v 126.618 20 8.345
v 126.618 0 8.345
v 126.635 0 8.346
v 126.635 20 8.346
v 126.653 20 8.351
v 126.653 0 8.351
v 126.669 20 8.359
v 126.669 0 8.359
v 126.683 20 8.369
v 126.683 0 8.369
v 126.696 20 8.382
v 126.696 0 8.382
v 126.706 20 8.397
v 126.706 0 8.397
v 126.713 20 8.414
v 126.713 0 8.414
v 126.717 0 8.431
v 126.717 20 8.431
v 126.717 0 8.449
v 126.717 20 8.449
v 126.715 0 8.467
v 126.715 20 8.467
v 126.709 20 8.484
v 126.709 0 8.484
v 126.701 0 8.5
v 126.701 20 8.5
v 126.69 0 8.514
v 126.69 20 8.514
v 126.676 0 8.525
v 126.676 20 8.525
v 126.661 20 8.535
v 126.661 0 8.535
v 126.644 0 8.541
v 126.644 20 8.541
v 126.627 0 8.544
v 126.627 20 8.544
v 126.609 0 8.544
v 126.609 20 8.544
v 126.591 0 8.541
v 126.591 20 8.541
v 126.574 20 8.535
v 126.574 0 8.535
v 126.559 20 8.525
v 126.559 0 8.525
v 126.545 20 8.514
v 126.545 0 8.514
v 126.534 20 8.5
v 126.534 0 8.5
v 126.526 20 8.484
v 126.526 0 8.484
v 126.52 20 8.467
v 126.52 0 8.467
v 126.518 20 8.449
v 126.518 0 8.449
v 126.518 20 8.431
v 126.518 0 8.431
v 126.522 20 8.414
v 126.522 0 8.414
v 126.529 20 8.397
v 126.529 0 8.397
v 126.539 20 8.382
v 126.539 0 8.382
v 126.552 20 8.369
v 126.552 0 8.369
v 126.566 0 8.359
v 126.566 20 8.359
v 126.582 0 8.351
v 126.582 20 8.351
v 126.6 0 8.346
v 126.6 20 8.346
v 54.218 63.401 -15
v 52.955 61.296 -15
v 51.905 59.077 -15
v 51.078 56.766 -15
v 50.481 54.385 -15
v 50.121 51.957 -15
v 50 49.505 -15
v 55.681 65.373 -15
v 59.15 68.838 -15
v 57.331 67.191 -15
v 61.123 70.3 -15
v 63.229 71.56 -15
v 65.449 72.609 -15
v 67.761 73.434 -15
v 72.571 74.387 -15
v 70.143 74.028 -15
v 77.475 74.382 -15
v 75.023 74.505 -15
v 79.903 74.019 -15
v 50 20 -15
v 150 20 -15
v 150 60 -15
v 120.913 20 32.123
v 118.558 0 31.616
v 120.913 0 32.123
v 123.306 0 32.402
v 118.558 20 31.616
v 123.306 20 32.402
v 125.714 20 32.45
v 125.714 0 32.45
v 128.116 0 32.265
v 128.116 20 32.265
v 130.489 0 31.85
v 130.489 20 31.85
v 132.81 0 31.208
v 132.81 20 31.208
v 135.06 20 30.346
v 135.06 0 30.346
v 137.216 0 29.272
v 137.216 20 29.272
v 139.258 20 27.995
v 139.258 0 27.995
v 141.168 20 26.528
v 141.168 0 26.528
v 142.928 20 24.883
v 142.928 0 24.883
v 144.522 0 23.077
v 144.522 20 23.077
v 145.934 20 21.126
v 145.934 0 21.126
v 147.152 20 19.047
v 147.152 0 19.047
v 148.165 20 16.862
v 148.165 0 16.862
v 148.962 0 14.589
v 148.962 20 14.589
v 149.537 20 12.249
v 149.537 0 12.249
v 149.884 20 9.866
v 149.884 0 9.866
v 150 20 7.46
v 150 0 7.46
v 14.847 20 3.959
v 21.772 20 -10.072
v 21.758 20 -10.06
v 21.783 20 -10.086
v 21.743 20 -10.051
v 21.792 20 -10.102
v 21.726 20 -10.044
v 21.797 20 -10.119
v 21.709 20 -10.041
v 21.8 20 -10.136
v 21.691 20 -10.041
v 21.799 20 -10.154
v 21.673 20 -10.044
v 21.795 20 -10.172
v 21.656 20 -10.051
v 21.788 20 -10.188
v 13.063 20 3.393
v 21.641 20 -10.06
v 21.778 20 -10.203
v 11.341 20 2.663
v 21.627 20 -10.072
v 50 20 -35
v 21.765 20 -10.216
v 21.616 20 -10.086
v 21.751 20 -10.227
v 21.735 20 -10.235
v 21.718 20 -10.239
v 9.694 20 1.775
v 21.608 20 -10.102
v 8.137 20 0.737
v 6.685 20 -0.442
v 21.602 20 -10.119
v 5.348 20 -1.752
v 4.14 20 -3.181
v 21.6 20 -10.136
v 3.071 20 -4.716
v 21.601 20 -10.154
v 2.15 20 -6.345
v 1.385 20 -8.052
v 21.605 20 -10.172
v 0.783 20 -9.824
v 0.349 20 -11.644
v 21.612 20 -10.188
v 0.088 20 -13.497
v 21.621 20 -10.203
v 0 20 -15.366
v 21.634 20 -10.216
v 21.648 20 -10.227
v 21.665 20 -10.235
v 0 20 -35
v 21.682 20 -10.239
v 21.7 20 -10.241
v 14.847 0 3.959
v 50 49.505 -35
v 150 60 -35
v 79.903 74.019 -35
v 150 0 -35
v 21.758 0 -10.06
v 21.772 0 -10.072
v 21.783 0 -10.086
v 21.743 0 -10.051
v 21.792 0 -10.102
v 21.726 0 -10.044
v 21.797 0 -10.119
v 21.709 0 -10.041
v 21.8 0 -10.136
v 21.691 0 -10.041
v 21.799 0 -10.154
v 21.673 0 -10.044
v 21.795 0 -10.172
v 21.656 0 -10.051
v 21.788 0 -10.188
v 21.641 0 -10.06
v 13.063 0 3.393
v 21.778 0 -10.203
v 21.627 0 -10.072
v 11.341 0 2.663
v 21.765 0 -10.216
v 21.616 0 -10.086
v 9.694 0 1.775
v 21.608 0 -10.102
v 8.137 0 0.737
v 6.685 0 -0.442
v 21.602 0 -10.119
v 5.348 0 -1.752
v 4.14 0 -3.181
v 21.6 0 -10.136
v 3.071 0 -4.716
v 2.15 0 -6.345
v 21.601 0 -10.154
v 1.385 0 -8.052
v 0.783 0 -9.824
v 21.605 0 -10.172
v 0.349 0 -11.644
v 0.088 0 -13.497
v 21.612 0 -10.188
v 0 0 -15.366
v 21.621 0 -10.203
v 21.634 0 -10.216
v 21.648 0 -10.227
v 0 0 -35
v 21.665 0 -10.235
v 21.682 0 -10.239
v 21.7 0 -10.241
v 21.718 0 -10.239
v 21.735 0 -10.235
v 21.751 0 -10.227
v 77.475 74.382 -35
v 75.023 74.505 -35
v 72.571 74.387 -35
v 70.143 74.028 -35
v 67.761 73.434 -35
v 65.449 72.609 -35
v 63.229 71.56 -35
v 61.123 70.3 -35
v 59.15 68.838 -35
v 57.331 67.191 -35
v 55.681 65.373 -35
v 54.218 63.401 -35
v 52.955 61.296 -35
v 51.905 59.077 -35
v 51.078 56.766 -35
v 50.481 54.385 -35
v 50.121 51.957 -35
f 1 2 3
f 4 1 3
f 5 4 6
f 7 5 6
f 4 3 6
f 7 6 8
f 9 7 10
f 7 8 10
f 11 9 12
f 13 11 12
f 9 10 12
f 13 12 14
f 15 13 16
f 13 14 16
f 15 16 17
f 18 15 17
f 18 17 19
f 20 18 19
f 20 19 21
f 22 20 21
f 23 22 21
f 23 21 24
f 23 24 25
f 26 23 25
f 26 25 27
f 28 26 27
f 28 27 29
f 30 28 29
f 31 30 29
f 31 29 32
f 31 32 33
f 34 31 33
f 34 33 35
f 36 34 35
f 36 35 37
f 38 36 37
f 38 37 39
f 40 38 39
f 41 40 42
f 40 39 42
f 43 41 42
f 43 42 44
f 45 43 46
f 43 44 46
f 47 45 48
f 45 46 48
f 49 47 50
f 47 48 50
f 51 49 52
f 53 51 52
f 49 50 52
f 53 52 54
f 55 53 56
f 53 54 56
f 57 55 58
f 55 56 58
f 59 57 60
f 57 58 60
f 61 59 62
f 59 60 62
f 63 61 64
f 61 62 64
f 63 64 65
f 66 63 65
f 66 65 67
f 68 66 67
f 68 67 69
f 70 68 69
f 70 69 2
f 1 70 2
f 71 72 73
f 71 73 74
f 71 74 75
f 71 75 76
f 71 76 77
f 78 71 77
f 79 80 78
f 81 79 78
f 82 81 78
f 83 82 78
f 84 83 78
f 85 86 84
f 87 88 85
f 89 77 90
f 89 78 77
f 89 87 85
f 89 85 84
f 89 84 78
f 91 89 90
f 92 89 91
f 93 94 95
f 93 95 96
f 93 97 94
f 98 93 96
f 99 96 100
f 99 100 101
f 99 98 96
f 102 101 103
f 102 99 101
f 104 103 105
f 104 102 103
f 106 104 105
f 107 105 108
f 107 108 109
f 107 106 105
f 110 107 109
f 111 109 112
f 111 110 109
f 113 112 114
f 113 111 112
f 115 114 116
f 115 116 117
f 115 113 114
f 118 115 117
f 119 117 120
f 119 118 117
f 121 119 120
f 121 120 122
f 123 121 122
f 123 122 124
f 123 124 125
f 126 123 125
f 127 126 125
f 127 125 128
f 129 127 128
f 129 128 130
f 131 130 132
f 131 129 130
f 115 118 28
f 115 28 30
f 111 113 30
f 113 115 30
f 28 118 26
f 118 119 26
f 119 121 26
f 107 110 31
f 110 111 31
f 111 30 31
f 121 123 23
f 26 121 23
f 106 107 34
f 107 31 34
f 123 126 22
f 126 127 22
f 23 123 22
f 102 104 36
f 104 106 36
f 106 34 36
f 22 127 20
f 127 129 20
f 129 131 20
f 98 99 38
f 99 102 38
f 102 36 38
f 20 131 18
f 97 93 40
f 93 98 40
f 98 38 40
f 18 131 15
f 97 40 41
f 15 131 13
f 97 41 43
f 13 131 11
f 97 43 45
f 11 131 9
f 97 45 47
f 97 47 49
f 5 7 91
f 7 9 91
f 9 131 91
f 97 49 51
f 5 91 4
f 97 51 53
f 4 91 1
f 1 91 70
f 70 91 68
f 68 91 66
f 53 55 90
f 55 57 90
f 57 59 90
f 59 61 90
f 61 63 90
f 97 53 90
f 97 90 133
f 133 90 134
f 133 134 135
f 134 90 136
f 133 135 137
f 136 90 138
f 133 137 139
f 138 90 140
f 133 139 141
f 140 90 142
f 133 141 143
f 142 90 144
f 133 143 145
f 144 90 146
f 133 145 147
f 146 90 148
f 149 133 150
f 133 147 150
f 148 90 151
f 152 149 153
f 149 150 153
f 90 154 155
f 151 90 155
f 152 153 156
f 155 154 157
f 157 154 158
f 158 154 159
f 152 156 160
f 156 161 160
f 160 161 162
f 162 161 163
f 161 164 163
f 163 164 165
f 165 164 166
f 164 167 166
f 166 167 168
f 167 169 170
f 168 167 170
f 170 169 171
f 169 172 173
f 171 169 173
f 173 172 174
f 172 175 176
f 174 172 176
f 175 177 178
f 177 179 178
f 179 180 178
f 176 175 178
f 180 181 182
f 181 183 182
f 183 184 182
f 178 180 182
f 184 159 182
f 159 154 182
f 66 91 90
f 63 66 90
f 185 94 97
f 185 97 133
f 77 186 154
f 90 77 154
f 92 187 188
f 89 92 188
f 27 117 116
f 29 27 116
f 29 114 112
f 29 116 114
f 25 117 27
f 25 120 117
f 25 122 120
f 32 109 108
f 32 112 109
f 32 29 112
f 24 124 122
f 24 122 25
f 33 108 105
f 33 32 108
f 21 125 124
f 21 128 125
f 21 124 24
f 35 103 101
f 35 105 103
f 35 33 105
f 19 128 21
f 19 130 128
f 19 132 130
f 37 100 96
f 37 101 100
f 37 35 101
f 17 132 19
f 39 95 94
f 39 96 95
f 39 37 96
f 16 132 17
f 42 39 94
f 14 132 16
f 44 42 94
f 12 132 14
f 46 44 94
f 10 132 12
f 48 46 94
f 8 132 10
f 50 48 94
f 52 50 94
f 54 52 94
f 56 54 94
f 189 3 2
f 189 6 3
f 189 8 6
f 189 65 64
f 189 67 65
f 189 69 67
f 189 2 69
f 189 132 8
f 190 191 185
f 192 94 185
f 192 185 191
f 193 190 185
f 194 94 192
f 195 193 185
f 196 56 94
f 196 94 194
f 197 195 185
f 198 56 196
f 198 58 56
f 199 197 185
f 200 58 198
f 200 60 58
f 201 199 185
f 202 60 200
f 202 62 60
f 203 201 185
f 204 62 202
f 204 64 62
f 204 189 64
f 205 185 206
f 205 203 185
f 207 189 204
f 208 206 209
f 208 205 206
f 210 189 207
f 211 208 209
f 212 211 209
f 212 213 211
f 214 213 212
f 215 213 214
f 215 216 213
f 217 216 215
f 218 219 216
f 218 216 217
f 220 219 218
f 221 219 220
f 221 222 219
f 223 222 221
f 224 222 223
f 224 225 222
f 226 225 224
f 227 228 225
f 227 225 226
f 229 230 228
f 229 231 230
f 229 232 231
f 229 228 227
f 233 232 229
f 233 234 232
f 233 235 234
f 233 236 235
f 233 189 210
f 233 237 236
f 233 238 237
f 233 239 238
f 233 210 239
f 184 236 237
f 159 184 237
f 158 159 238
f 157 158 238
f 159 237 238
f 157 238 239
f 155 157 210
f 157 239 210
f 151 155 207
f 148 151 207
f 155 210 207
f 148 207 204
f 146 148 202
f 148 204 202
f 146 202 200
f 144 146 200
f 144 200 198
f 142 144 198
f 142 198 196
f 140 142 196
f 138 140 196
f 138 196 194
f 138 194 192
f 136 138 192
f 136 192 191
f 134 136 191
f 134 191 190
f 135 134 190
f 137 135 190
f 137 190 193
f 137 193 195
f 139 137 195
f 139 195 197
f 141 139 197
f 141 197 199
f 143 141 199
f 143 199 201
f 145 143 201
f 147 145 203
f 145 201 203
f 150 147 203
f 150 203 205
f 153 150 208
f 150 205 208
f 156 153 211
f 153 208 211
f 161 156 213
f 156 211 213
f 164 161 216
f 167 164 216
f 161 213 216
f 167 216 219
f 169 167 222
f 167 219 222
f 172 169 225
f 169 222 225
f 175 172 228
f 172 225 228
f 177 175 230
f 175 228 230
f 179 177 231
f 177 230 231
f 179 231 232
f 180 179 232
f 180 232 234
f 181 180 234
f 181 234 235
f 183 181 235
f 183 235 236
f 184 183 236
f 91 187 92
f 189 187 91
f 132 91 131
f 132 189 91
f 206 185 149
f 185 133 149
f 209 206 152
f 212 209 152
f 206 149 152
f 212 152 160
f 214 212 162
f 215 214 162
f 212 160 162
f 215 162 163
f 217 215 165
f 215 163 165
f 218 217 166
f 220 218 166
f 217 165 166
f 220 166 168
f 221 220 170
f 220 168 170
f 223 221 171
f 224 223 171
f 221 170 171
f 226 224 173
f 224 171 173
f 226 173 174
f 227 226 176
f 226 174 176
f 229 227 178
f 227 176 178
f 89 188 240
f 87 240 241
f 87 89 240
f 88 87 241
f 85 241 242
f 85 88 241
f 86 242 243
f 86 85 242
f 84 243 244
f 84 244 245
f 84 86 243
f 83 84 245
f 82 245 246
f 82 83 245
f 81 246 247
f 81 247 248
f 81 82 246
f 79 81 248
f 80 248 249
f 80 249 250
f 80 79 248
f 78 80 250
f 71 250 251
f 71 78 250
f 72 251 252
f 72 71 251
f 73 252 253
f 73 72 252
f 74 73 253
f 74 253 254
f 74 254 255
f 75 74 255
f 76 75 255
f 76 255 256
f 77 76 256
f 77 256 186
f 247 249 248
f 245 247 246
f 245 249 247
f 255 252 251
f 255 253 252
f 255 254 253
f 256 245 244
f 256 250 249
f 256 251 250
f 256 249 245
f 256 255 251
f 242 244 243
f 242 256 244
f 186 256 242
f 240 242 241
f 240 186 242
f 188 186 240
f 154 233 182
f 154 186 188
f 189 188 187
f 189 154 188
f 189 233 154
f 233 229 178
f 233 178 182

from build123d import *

# Parameters (mm, degrees)
BOSS_EXTRUDE1_DEPTH        = 20
BOSS_EXTRUDE2_DEPTH        = 20
FILLET1_R                  = 20
FILLET2_R                  = 25
F_0_2_0_2_DIAMETER_HOLE1_D = 0.2


with BuildPart() as part:
    # Sketch1 → Boss-Extrude1 (new body)
    with BuildSketch(Plane(origin=(0, 0, 0), x_dir=(1, 0, 0), z_dir=(0, 1, 0))):
        Polygon((0, 0), (0, 35), (150, 35), (150, -40), align=None)
    extrude(amount=BOSS_EXTRUDE1_DEPTH)

    # Sketch3 → Boss-Extrude2 (add)
    with BuildSketch(Plane(origin=(0, 0, -35), x_dir=(-1, 0, 0), z_dir=(0, 0, -1))):
        Polygon((-150, 0), (-150, 60), (-50, 80), (-50, 0), align=None)
    extrude(amount=-BOSS_EXTRUDE2_DEPTH)

    # Fillet1
    fillet1_edges = [part.edges().sort_by_distance(p)[0] for p in [
        (0, 10, 0),
    ]]
    fillet(fillet1_edges, radius=FILLET1_R)

    # Fillet2
    fillet2_edges = [part.edges().sort_by_distance(p)[0] for p in [
        (50, 80, -25),
        (150, 10, 40),
    ]]
    fillet(fillet2_edges, radius=FILLET2_R)

    # Ø0.2 (0.2) Diameter Hole1 (through all)
    with Locations(Plane(origin=(21.699653265, 20, -10.140884984), x_dir=(0, 0, 1), z_dir=(0, 1, 0))):
        with Locations((0, 0), (18.585454109, 104.917886097)):
            Hole(F_0_2_0_2_DIAMETER_HOLE1_D / 2)


solid = part.part
